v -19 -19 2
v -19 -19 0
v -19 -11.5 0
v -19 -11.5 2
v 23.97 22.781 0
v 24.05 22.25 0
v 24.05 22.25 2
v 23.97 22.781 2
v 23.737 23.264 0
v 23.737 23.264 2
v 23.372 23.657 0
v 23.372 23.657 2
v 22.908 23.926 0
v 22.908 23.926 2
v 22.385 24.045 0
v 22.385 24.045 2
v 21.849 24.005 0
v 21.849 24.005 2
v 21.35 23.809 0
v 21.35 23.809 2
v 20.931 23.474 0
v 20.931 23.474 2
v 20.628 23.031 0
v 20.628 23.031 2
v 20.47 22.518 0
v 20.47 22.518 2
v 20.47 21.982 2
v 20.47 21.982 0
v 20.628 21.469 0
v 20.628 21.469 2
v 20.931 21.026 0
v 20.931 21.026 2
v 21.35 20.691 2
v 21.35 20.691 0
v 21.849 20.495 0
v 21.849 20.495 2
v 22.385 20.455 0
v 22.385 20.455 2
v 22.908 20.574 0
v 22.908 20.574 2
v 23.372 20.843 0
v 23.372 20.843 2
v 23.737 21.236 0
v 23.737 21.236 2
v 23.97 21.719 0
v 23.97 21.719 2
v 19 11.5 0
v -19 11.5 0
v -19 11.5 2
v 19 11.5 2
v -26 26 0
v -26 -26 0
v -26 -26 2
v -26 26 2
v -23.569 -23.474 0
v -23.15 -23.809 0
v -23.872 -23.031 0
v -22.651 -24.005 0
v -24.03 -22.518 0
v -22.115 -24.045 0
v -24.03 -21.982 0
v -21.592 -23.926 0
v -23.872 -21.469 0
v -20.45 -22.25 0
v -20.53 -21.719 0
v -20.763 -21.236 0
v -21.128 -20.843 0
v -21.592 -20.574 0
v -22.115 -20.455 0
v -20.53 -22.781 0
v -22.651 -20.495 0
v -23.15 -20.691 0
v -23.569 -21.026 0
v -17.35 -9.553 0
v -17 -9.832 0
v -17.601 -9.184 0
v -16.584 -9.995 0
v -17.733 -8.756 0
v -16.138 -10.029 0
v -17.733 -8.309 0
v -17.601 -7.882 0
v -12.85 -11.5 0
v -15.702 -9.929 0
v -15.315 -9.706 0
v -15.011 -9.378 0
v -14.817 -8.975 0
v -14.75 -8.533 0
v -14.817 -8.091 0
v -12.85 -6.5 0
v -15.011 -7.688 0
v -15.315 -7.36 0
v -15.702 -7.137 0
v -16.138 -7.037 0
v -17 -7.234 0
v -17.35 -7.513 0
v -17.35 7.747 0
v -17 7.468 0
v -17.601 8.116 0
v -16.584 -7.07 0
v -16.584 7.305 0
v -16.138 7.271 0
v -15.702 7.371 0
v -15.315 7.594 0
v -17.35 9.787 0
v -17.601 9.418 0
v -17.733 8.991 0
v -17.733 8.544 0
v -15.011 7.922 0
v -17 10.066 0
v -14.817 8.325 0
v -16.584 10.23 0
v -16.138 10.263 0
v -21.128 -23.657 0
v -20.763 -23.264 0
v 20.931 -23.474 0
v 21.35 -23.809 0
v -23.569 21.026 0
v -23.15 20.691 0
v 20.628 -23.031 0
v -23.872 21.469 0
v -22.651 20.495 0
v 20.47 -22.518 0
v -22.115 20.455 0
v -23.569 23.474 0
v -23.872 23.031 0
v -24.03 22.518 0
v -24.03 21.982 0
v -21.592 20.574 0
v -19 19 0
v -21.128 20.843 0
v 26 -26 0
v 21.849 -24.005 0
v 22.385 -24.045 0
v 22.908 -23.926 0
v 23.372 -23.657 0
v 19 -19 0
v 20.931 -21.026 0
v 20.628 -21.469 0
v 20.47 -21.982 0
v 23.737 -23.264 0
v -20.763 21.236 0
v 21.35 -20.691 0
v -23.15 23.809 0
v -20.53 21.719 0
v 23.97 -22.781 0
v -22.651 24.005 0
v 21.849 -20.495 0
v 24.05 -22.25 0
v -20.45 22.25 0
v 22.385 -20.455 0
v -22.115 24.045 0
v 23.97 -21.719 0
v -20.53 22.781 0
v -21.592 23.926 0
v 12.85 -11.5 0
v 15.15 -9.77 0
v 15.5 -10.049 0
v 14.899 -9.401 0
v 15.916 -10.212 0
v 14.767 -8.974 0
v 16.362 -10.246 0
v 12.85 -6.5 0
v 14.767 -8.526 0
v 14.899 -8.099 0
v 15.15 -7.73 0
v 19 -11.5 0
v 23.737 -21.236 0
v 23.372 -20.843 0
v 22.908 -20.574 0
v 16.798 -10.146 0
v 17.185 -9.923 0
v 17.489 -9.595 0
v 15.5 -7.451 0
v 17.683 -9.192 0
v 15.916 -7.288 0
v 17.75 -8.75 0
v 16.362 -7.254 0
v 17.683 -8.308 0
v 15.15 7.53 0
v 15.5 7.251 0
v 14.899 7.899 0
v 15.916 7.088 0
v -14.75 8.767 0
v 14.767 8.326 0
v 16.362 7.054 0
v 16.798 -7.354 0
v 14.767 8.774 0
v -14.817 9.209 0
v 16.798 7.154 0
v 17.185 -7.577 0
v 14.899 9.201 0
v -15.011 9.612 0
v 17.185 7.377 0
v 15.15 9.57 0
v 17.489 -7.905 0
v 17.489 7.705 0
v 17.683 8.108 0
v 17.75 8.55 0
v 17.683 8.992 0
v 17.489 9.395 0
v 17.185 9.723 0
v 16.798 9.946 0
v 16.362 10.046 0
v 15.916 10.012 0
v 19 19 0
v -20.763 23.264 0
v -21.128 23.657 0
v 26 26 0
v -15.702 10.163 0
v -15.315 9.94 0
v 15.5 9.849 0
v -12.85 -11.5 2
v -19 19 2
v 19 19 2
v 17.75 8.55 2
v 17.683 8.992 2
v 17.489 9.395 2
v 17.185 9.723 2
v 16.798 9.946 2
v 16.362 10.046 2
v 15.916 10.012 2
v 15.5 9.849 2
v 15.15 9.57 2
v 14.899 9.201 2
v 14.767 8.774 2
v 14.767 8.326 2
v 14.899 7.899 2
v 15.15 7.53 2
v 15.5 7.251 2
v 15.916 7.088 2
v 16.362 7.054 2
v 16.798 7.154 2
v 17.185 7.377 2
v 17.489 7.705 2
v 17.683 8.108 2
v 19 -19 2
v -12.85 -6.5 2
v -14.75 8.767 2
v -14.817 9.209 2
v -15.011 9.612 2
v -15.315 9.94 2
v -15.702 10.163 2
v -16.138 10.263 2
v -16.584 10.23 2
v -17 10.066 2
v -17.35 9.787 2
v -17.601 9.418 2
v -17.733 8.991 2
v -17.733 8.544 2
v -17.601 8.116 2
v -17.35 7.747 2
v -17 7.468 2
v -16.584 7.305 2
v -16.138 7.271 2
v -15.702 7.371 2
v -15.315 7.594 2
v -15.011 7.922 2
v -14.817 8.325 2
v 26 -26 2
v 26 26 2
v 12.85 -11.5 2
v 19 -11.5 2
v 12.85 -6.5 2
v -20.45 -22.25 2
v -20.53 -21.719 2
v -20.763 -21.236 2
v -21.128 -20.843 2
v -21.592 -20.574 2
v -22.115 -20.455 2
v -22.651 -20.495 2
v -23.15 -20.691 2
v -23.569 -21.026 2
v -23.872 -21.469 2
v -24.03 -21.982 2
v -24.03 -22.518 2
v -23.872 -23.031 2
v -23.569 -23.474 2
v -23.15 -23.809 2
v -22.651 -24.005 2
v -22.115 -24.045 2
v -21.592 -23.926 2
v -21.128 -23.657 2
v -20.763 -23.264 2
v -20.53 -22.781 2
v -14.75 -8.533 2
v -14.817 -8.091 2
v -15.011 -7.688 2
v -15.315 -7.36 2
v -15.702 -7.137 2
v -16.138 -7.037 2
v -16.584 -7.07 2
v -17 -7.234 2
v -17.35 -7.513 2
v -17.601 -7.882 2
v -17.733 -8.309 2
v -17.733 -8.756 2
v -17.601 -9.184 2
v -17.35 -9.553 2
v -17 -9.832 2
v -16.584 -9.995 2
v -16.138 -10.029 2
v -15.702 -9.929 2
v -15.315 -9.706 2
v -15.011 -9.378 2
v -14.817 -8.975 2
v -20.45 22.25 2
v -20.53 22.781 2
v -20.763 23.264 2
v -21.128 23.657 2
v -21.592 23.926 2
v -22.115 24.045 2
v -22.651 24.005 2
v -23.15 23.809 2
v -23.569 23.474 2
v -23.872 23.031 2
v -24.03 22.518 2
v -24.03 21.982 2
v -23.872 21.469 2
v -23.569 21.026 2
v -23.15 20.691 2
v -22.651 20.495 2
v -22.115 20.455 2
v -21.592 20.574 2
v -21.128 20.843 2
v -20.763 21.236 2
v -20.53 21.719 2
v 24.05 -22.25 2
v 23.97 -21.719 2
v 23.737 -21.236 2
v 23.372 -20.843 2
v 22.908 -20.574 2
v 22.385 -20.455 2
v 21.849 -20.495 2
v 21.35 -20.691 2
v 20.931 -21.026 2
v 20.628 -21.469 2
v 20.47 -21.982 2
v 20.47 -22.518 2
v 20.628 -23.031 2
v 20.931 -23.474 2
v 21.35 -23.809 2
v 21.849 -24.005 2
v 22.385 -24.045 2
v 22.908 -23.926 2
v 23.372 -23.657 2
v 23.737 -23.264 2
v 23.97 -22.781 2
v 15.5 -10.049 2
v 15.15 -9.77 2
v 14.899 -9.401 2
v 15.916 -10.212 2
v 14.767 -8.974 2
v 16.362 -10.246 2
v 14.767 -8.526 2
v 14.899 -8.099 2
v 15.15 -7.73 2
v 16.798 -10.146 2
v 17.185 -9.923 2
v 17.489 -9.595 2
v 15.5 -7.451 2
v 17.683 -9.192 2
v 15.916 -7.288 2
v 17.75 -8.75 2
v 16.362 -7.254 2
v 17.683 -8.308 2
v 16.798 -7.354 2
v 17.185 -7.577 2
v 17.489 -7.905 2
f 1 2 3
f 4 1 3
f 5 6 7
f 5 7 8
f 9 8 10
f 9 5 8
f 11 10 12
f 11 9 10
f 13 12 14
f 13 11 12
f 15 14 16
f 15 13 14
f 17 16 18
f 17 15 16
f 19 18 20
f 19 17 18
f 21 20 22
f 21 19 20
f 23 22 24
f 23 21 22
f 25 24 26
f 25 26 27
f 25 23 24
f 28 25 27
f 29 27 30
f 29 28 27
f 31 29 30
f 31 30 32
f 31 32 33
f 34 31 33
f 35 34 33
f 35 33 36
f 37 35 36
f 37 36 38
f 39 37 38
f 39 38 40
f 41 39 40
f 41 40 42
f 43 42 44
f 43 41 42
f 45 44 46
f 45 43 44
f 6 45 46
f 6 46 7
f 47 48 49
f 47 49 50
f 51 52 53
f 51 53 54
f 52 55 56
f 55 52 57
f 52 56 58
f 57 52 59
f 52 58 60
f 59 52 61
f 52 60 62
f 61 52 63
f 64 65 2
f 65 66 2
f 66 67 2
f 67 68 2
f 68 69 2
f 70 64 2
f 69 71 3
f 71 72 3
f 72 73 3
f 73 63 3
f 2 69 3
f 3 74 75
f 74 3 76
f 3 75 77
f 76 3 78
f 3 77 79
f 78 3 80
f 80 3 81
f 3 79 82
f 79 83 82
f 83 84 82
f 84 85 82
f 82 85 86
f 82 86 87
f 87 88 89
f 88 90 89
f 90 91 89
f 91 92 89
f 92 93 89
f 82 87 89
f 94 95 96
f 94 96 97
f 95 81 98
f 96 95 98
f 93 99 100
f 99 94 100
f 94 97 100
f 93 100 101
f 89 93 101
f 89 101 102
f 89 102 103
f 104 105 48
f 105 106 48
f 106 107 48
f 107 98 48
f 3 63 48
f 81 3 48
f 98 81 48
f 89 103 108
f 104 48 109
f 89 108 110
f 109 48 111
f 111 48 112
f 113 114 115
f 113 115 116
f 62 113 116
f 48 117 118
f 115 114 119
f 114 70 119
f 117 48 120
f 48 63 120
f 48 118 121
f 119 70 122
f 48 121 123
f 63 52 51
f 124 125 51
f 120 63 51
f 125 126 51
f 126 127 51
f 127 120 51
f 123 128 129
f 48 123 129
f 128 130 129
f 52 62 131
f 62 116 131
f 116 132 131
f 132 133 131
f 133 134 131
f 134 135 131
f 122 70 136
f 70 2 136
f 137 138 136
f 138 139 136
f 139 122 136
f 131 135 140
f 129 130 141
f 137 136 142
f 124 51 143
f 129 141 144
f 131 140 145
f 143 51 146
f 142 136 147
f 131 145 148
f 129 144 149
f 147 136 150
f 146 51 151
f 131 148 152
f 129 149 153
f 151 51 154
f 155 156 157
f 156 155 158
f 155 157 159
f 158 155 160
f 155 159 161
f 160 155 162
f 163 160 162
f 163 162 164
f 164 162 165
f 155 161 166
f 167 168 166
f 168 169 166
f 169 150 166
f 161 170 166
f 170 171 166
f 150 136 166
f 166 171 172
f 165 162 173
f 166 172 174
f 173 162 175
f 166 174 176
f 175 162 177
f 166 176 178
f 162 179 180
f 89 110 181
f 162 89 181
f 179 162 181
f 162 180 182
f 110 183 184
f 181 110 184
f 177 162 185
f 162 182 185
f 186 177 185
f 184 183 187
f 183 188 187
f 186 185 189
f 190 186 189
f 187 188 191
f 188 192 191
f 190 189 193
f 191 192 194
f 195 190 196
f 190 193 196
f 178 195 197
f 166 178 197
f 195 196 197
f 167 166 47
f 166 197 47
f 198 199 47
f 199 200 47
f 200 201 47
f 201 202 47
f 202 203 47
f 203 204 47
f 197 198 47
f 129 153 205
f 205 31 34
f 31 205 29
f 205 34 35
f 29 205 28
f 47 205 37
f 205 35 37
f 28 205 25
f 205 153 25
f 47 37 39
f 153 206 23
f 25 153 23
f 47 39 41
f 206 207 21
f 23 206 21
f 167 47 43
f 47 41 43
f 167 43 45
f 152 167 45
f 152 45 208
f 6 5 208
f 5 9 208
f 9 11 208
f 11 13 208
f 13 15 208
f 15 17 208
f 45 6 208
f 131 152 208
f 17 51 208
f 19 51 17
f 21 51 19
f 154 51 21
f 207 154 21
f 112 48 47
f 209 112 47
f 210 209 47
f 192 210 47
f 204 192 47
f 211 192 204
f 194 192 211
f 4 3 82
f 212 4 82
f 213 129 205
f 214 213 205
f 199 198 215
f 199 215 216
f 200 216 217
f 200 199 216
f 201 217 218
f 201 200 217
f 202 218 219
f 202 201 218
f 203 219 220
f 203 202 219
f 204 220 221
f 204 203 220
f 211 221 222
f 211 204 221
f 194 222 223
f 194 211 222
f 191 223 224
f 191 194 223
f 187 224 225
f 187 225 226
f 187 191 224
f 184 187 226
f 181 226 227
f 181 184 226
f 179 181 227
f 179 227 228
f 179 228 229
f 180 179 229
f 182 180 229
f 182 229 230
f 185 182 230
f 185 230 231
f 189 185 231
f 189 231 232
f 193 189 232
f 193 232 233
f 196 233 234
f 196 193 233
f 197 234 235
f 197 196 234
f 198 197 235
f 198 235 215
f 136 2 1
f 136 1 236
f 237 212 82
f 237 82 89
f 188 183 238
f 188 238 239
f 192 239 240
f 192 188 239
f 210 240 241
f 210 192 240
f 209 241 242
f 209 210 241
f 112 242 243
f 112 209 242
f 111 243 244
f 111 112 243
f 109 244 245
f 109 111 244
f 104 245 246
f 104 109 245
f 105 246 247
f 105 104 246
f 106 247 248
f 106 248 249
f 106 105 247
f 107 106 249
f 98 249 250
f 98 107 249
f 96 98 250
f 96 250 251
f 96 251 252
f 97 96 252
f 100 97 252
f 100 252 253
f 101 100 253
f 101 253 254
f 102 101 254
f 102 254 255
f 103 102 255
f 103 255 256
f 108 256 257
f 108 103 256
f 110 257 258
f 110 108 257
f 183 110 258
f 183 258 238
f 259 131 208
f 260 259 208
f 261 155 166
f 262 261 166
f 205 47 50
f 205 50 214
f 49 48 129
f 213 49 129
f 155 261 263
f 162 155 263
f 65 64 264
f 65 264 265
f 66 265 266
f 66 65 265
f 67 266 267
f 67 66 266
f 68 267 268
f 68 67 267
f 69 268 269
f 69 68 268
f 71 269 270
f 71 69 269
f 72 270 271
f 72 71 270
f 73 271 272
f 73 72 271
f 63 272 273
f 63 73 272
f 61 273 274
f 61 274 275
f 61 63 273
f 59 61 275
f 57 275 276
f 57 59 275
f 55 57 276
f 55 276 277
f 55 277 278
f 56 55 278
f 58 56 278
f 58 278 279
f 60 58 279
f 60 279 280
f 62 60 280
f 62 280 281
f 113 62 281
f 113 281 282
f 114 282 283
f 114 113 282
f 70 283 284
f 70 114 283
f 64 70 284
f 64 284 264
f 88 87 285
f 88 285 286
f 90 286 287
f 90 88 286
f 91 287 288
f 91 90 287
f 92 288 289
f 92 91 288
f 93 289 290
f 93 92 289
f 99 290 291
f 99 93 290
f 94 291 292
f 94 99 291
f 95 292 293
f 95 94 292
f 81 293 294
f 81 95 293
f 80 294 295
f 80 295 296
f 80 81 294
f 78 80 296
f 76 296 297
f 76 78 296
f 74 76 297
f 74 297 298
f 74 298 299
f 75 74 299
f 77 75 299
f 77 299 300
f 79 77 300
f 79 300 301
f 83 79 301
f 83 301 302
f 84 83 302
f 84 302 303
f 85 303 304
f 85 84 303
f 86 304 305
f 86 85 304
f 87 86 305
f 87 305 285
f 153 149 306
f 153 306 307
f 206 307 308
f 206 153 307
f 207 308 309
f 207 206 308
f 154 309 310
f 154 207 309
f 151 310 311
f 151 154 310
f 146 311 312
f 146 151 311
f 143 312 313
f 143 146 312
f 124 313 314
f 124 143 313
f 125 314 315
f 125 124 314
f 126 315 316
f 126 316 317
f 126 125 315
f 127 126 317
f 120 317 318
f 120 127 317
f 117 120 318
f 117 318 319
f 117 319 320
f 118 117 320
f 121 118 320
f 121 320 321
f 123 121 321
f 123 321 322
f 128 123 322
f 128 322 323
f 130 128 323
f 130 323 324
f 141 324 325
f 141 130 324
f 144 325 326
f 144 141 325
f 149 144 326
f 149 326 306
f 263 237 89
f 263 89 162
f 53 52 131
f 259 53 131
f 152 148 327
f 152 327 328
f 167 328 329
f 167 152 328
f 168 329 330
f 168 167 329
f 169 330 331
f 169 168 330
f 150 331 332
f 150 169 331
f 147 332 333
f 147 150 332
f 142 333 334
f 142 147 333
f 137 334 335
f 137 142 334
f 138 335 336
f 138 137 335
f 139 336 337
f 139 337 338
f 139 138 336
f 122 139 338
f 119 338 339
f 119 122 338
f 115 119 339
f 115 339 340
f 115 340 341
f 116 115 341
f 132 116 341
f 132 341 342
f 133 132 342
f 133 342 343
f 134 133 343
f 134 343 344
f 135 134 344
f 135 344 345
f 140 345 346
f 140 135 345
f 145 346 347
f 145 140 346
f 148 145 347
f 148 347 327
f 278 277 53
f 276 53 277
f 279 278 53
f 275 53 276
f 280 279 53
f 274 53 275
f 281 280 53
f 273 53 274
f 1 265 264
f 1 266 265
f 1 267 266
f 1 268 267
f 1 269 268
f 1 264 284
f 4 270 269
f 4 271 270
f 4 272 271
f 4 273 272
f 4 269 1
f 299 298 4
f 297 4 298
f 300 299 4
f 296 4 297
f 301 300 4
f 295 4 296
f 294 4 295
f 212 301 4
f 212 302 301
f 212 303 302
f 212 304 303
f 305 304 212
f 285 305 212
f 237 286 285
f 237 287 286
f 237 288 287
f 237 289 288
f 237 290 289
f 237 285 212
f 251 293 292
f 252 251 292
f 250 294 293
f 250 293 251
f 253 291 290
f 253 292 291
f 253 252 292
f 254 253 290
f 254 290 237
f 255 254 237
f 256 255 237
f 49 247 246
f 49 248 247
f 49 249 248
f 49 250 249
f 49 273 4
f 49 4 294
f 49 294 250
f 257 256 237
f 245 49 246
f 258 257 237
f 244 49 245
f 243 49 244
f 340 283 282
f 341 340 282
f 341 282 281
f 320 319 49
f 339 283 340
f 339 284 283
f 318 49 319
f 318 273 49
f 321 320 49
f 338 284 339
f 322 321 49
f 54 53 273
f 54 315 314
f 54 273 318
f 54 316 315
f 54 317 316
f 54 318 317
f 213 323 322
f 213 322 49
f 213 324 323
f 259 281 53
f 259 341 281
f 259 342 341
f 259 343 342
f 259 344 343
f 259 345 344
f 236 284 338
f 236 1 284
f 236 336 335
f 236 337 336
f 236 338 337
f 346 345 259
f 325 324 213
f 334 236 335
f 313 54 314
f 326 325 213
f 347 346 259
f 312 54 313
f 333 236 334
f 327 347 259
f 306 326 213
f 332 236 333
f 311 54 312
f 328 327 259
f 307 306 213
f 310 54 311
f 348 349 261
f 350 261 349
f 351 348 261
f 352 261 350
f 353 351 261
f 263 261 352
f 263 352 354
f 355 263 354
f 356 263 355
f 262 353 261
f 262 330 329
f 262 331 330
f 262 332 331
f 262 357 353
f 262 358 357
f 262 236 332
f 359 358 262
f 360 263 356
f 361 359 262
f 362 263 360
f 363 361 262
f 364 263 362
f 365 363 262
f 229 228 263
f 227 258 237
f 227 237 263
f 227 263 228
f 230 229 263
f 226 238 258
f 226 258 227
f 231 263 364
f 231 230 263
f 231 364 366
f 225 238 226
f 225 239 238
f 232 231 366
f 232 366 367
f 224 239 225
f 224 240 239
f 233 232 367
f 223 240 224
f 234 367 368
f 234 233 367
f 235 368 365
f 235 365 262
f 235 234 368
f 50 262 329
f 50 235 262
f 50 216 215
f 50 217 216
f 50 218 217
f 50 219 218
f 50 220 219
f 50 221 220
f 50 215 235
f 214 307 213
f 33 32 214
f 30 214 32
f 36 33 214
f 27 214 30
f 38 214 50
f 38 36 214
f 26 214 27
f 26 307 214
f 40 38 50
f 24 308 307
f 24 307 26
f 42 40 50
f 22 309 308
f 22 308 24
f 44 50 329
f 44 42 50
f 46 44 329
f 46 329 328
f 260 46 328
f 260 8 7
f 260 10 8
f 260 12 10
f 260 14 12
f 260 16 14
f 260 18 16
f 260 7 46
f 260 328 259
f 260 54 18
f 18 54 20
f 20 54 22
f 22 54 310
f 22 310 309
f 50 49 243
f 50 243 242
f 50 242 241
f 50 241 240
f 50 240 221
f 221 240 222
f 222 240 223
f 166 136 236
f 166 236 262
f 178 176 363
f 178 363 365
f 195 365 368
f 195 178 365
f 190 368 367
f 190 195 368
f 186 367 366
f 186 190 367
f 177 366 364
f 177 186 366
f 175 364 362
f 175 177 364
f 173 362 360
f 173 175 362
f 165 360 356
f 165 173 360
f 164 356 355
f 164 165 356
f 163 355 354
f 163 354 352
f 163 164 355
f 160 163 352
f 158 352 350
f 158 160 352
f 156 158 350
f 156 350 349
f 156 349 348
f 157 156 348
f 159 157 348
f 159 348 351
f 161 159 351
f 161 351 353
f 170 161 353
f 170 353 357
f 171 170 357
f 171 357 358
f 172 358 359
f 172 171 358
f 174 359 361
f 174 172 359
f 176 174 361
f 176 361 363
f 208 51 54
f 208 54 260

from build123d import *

# Parameters (mm, degrees)
SKETCH_W     = 52
SKETCH_H     = 52
SKETCH_R     = 1.8
SKETCH_R_2   = 1.5
SKETCH_W_2   = 38
SKETCH_H_2   = 7.5
PAD_DEPTH    = 2
SKETCH001_W  = 25.7
SKETCH001_H  = 8
POCKET_DEPTH = 5


with BuildPart() as part:
    # Sketch → Pad (new body)
    with BuildSketch(Plane.XY):
        Rectangle(SKETCH_W, SKETCH_H)
        with Locations((22.25, 22.25)):
            Circle(SKETCH_R, mode=Mode.SUBTRACT)
        with Locations((22.25, -22.25)):
            Circle(SKETCH_R, mode=Mode.SUBTRACT)
        with Locations((-22.25, 22.25)):
            Circle(SKETCH_R, mode=Mode.SUBTRACT)
        with Locations((-22.25, -22.25)):
            Circle(SKETCH_R, mode=Mode.SUBTRACT)
        with Locations((16.25, 8.55)):
            Circle(SKETCH_R_2, mode=Mode.SUBTRACT)
        with Locations((-16.25, 8.76716)):
            Circle(SKETCH_R_2, mode=Mode.SUBTRACT)
        with Locations((-16.25, -8.53284)):
            Circle(SKETCH_R_2, mode=Mode.SUBTRACT)
        with Locations((16.25, -8.75)):
            Circle(SKETCH_R_2, mode=Mode.SUBTRACT)
        with Locations((0, 15.25)):
            Rectangle(SKETCH_W_2, SKETCH_H_2, mode=Mode.SUBTRACT)
        with Locations((0, -15.25)):
            Rectangle(SKETCH_W_2, SKETCH_H_2, mode=Mode.SUBTRACT)
    extrude(amount=PAD_DEPTH)

    # Sketch001 → Pocket (cut)
    with BuildSketch(Plane.XY.offset(2)):
        with Locations((0, -10.5)):
            Rectangle(SKETCH001_W, SKETCH001_H)
    extrude(amount=-POCKET_DEPTH, mode=Mode.SUBTRACT)


solid = part.part
